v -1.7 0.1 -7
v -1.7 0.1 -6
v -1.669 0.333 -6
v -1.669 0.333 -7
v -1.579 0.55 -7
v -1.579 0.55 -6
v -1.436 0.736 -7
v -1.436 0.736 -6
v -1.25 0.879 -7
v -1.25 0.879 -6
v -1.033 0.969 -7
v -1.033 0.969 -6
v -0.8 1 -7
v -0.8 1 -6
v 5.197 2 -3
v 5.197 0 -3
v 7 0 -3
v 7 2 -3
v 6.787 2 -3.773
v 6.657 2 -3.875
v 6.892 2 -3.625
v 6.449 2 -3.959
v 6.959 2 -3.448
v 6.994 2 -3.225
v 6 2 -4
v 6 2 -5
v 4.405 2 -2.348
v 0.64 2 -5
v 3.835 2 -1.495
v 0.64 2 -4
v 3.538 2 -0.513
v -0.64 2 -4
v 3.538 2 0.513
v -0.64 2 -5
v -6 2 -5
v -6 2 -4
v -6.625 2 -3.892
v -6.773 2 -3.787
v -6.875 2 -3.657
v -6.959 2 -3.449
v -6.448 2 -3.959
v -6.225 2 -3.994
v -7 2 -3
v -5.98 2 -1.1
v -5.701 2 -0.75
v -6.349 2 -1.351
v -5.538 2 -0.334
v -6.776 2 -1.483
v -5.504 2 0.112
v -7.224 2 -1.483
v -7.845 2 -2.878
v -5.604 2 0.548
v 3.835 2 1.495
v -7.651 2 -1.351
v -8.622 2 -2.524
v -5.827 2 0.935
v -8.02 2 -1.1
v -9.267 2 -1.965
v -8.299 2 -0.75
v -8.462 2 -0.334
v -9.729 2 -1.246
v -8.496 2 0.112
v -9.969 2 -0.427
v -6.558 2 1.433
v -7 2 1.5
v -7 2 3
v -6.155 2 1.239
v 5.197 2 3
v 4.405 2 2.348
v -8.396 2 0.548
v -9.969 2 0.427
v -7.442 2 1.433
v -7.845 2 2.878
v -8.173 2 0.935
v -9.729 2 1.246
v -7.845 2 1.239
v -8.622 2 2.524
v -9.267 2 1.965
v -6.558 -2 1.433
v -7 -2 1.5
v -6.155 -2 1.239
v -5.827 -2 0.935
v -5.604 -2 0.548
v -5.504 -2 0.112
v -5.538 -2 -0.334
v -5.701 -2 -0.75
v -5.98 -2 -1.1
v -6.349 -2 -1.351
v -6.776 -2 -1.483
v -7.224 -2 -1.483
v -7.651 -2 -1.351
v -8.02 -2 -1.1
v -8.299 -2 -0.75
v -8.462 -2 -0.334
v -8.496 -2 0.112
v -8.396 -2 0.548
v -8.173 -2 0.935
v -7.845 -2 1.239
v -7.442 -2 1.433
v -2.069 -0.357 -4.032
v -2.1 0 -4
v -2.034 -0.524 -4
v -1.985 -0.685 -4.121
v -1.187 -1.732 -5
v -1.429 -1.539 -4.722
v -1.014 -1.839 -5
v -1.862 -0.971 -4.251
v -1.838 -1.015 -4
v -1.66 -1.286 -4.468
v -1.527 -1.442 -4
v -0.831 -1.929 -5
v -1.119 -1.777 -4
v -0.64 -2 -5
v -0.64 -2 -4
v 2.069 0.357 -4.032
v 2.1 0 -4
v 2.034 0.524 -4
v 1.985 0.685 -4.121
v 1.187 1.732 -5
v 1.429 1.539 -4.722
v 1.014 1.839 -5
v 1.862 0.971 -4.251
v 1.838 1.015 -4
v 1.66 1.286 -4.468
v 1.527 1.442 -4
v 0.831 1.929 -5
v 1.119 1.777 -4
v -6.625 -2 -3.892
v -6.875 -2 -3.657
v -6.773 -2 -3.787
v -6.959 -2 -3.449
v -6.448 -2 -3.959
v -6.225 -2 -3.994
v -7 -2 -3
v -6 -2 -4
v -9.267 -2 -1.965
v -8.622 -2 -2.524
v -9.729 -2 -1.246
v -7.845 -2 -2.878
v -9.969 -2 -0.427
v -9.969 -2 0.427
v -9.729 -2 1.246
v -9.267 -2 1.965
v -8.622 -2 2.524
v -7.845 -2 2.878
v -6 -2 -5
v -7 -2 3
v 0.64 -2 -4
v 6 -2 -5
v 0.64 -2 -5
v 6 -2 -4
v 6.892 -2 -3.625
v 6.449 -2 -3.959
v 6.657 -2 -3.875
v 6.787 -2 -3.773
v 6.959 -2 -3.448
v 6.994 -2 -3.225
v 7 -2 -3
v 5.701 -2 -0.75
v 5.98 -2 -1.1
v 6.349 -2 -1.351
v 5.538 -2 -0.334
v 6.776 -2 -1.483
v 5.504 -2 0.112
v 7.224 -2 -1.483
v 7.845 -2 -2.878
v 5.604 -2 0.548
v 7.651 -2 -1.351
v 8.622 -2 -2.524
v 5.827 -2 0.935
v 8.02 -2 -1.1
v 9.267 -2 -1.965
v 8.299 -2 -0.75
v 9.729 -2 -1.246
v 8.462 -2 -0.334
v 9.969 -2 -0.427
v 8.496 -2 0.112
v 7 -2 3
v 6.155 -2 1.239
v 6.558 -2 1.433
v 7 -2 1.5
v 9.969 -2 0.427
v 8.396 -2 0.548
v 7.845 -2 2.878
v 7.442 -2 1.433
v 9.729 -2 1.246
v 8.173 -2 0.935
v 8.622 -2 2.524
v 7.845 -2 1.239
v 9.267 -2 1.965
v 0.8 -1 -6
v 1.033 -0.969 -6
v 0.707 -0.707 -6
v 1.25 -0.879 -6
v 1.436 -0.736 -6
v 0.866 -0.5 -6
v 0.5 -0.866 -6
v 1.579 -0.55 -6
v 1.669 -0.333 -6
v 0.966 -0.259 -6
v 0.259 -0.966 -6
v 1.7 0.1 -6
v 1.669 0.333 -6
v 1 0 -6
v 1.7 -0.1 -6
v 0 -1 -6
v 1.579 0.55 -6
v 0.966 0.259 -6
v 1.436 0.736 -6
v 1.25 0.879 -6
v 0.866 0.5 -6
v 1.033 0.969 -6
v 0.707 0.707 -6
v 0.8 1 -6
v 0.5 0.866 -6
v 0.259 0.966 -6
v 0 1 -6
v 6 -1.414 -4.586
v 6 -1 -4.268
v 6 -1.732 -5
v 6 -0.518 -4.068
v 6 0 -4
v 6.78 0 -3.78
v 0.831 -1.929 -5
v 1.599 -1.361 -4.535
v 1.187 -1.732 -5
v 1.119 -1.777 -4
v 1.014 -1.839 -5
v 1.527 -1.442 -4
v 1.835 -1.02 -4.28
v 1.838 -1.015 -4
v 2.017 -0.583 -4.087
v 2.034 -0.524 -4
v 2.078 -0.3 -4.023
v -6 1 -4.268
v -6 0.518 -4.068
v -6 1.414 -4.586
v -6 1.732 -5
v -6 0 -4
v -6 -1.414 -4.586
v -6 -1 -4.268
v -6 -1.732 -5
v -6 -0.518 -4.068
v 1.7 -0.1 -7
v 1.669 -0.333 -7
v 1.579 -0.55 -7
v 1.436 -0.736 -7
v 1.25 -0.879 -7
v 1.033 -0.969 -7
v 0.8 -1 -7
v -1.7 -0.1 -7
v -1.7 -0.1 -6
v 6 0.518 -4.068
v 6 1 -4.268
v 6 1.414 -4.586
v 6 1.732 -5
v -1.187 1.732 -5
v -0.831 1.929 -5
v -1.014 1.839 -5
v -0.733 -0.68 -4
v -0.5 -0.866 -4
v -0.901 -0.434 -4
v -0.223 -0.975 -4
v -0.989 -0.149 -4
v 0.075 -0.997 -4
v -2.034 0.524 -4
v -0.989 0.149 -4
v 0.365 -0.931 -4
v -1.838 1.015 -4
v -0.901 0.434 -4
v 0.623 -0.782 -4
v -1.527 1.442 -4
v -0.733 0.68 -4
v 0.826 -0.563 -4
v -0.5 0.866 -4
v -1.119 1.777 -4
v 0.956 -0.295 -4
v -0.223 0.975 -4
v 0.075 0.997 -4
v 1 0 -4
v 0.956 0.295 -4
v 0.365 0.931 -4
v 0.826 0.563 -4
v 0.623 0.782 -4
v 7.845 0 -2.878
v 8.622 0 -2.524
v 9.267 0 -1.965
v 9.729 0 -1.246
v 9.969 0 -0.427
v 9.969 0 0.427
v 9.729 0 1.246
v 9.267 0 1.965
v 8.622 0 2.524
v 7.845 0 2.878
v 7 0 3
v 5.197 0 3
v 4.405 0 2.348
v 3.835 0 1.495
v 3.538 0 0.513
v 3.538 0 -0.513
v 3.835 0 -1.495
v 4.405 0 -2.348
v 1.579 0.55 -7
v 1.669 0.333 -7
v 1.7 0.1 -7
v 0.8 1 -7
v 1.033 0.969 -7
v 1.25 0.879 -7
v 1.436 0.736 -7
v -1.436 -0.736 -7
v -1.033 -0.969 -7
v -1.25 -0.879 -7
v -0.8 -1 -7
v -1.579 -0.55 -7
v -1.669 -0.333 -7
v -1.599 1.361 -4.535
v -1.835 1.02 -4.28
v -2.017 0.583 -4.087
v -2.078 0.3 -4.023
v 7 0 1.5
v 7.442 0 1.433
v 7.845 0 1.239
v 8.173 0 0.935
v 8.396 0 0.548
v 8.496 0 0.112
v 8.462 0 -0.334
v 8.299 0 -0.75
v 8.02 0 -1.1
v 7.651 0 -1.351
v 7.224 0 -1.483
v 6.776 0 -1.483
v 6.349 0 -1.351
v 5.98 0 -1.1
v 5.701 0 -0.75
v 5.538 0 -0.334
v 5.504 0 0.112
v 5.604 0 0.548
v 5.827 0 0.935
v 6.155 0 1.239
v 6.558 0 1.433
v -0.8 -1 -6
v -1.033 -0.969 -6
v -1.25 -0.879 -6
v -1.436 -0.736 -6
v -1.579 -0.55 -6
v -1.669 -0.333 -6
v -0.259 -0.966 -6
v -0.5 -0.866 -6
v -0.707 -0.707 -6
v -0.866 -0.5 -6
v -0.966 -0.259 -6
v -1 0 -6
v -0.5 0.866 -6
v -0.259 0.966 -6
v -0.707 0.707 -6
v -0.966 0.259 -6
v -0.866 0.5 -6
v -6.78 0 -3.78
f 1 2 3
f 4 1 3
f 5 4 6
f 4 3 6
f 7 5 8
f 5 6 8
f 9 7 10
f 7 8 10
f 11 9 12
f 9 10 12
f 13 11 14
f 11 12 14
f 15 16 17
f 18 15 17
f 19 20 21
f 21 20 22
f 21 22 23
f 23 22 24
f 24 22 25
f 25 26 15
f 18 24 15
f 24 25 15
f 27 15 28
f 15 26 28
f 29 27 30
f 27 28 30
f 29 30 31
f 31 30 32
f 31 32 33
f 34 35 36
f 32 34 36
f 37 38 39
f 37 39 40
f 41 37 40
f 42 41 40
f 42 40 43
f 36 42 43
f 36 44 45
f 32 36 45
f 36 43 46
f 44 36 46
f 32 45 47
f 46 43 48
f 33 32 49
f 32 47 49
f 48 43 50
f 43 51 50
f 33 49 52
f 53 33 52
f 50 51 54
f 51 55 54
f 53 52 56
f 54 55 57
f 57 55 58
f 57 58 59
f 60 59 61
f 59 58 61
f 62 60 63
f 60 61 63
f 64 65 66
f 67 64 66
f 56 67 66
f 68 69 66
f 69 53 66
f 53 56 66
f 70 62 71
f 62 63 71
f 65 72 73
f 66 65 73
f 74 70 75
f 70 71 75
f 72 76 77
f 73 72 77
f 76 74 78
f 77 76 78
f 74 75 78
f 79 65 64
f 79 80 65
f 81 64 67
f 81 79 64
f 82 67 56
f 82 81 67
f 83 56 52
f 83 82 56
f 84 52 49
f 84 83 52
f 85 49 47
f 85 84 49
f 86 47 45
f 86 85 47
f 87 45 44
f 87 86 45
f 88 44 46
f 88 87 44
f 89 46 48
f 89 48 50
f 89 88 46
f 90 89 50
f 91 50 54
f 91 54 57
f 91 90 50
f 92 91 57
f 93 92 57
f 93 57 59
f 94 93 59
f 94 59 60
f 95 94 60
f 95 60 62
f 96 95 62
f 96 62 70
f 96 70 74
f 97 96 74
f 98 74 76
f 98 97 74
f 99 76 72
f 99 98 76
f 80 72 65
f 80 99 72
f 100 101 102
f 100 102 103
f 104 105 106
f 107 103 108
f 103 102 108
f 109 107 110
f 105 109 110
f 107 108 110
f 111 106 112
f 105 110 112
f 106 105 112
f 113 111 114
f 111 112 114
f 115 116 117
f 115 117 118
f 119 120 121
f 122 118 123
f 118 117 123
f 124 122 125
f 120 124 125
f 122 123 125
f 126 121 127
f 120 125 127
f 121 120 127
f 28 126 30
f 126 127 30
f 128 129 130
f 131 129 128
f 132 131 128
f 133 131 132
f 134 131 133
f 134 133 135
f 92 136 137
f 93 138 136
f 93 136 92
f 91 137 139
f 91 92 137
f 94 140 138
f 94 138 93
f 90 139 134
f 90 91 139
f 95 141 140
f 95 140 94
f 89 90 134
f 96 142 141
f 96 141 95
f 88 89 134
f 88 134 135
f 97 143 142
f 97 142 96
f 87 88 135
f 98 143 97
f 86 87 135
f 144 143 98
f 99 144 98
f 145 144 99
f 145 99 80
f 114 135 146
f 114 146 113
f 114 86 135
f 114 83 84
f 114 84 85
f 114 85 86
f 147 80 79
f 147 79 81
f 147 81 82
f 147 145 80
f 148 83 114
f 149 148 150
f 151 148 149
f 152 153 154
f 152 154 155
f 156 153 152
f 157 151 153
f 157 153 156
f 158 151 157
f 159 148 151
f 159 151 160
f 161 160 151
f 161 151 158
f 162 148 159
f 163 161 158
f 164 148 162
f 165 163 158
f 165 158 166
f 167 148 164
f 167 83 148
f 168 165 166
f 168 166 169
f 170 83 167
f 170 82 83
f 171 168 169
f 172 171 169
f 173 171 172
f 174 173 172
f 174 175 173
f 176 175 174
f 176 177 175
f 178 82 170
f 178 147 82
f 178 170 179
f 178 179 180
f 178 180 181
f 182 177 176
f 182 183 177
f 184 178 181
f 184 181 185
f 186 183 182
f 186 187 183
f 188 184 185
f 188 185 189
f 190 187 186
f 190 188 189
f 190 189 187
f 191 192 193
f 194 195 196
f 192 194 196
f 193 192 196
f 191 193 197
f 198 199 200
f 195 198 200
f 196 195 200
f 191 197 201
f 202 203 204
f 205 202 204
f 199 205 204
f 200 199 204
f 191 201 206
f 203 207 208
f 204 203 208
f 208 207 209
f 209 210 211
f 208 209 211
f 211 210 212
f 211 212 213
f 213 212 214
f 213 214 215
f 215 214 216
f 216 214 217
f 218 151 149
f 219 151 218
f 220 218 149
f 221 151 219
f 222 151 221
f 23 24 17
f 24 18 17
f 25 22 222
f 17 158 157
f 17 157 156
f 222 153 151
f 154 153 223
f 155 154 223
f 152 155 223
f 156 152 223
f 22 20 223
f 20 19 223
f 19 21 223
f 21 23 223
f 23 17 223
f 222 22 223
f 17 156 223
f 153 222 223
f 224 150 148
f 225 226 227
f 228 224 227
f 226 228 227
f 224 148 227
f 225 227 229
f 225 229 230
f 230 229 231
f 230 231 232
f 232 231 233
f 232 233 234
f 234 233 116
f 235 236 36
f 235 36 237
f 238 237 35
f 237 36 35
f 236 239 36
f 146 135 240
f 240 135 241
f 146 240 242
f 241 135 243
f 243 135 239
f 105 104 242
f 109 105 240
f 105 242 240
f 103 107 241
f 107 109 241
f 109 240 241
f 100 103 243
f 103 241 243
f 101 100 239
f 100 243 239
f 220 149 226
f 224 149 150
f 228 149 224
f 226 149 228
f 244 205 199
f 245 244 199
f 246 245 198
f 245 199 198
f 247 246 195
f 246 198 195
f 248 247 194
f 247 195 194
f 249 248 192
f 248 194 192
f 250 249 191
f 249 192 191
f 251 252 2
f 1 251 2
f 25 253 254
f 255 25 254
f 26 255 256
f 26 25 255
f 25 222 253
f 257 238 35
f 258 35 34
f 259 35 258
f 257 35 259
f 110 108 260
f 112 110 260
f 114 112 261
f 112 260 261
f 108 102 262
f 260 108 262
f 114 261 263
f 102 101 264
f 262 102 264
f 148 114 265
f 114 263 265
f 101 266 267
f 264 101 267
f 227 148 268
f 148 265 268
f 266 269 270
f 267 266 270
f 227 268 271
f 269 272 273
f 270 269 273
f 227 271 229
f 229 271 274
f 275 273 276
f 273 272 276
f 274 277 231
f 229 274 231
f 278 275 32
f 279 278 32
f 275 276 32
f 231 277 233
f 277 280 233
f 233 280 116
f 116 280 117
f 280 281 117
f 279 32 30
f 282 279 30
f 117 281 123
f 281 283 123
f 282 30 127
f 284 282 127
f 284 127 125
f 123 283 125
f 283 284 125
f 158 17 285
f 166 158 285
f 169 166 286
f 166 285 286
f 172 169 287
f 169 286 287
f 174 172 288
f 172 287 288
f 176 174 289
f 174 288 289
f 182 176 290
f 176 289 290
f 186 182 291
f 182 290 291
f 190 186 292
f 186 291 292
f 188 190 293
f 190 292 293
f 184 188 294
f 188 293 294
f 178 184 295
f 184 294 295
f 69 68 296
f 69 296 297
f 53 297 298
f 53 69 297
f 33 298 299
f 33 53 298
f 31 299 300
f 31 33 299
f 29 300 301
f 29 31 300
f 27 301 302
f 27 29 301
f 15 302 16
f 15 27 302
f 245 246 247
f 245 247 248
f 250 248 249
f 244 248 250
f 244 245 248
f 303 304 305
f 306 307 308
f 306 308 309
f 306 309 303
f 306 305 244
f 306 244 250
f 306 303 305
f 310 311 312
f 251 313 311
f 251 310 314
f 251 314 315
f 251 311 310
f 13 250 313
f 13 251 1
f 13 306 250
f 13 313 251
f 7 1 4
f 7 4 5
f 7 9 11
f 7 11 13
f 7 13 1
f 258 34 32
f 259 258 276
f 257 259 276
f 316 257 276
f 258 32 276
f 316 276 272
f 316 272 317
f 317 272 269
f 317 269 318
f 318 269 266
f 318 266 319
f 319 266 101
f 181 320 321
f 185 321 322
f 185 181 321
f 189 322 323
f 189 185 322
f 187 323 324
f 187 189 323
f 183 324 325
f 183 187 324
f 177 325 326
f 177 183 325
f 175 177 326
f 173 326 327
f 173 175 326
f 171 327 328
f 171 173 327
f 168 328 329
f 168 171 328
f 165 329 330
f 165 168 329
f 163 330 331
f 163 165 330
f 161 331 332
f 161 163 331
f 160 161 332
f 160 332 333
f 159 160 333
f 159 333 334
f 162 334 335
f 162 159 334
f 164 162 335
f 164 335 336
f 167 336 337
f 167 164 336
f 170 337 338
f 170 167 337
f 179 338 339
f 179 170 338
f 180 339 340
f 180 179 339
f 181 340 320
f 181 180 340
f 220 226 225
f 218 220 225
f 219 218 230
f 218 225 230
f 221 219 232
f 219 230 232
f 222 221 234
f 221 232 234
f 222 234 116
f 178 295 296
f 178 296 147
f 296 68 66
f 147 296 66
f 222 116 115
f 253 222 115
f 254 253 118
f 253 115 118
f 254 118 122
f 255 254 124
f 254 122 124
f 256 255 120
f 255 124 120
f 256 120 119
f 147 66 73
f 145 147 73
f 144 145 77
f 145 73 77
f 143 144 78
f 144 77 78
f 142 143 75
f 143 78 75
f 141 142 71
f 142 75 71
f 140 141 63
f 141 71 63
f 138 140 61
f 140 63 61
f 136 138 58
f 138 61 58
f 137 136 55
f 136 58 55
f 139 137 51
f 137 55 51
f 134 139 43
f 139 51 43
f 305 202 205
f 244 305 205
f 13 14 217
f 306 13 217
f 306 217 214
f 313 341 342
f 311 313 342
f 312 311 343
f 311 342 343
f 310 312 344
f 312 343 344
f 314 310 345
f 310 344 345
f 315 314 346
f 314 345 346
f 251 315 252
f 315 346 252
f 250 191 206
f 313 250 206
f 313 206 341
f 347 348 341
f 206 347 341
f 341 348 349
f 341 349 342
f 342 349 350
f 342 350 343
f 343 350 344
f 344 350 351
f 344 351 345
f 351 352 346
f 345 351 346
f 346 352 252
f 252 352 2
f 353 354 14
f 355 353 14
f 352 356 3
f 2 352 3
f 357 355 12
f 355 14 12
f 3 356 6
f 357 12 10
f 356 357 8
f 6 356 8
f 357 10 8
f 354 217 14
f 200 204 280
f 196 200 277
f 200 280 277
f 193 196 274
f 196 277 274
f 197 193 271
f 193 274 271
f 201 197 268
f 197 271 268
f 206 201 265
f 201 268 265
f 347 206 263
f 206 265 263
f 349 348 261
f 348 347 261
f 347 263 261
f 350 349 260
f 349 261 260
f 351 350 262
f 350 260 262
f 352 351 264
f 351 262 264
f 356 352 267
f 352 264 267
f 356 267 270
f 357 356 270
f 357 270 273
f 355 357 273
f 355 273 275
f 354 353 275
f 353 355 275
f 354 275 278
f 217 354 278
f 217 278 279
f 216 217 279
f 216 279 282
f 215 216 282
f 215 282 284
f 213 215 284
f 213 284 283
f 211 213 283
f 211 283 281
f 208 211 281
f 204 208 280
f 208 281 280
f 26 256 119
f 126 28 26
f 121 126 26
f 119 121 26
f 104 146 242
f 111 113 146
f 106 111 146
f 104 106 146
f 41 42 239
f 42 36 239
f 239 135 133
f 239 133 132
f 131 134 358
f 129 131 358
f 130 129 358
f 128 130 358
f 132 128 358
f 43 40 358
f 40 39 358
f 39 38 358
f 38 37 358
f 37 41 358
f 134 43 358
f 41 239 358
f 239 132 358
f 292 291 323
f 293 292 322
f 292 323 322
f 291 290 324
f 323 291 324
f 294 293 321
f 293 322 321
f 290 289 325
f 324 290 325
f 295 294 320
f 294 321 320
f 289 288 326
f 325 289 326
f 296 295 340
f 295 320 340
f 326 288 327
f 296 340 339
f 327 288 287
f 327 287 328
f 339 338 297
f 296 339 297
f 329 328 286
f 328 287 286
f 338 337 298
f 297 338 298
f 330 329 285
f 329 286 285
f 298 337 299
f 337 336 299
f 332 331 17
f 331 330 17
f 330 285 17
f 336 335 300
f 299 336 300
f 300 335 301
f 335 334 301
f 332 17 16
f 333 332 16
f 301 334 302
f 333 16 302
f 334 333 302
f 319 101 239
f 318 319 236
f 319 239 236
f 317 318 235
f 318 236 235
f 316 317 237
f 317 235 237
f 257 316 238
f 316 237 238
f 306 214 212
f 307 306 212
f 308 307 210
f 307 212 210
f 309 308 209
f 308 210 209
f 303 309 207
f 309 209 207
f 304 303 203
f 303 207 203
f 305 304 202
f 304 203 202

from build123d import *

# Parameters (mm, degrees)
SKETCH1_R                = 1.5
BOSS_EXTRUDE1_DEPTH      = 2
CUT_EXTRUDE1_DEPTH       = 2
BOSS_EXTRUDE2_REACH      = 13.18
SKETCH3_W                = 14
SKETCH3_H                = 1
FILLET1_SIZE             = 1
BOSS_EXTRUDE3_DEPTH      = 6
BOSS_EXTRUDE3_DEPTH_BACK = 6
CUT_EXTRUDE4_START       = -4
SKETCH5_R                = 2.1
CUT_EXTRUDE4_DEPTH       = 10
SKETCH6_R                = 1
BOSS_EXTRUDE5_DEPTH      = 3
BOSS_EXTRUDE6_START      = 2
BOSS_EXTRUDE6_DEPTH      = 1


with BuildPart() as part:
    # Sketch1 → Boss-Extrude1 (new, symmetric)
    with BuildSketch(Plane(origin=(0, 0, 0), x_dir=(1, 0, 0), z_dir=(0, 1, 0))):
        with BuildLine():
            Line((-7, 3), (7, 3))
            ThreePointArc((7, 3), (10, 0), (7, -3))
            Line((7, -3), (-7, -3))
            ThreePointArc((-7, -3), (-10, 0), (-7, 3))
        make_face()
        with Locations(Location((-7, 0, 0), (0, 0, 270))):
            Circle(SKETCH1_R, mode=Mode.SUBTRACT)
        with Locations(Location((7, 0, 0), (0, 0, 270))):
            Circle(SKETCH1_R, mode=Mode.SUBTRACT)
    extrude(amount=BOSS_EXTRUDE1_DEPTH, both=True)

    # Sketch2 → Cut-Extrude1 (cut)
    with BuildSketch(Plane(origin=(0, 2, 0), x_dir=(1, 0, 0), z_dir=(0, 1, 0))):
        with BuildLine():
            Line((5.197224362, 3), (7, 3))
            ThreePointArc((7, 3), (10, 0), (7, -3))
            Line((7, -3), (5.197224362, -3))
            ThreePointArc((5.197224362, -3), (3.5, 0), (5.197224362, 3))
        make_face()
    extrude(amount=-CUT_EXTRUDE1_DEPTH, mode=Mode.SUBTRACT)

    # Boss-Extrude2: up to this face of the body (flat: up to its plane)
    boss_extrude2_end = Plane(part.part.faces().sort_by_distance((-2.270949872, 2, 0))[0])
    # Sketch3 → Boss-Extrude2 (add, up to the picked face)
    with BuildSketch(Plane.XZ.offset(2), mode=Mode.PRIVATE) as boss_extrude2_sk1:
        with Locations((0, -3.5)):
            Rectangle(SKETCH3_W, SKETCH3_H)
    boss_extrude2_tool1 = split(extrude(boss_extrude2_sk1.sketch, amount=-BOSS_EXTRUDE2_REACH, mode=Mode.PRIVATE), bisect_by=boss_extrude2_end, keep=Keep.BOTH, mode=Mode.PRIVATE)
    add(boss_extrude2_tool1.solids().sort_by(Axis((0, -2, -3.5), (0, 1, 0)))[0])

    # Fillet1
    # a fillet whose section is not a circle: 1 mm, written as the material it takes off along each edge
    with BuildSketch(Plane(origin=(7, -4.5, -4), x_dir=(0, 0, 1), z_dir=(0, 1, 0)), Plane(origin=(-7, -4.5, -4), x_dir=(1, 0, 0), z_dir=(0, 1, 0))) as fillet1_piece_1:
        with BuildLine():
            add(Edge.make_bspline([(FILLET1_SIZE, 0), (FILLET1_SIZE * 0.831801948466, 0), (FILLET1_SIZE * 0.663603896932, 0), (FILLET1_SIZE * 0.292893218813, -FILLET1_SIZE * 0.0716919198361), (FILLET1_SIZE * 0.0716919198361, -FILLET1_SIZE * 0.292893218813), (0, -FILLET1_SIZE * 0.663603896932), (0, -FILLET1_SIZE * 0.831801948466), (0, -FILLET1_SIZE)], knots=[0, 0, 0, 0, 0, 0, 0.5, 0.5, 1, 1, 1, 1, 1, 1], degree=5))
            Line((0, -FILLET1_SIZE), (0, 0))
            Line((0, 0), (FILLET1_SIZE, 0))
        make_face()
    extrude(amount=9, mode=Mode.SUBTRACT)

    # Sketch4 → Boss-Extrude3 (add, two sides: drawn at the far end of the back side and taken through both)
    with BuildSketch(Plane(origin=(0, 0, 0), x_dir=(0, 0, -1), z_dir=(1, 0, 0)).offset(-BOSS_EXTRUDE3_DEPTH_BACK)):
        with BuildLine():
            Line((5, 2), (4, 2))
            Line((4, 2), (4, 0))
            ThreePointArc((4, 0), (4.267949192, 1), (5, 1.732050808))
            Line((5, 1.732050808), (5, 2))
        make_face()
        with BuildLine():
            ThreePointArc((5, -1.732050808), (4.267949192, -1), (4, 0))
            Line((4, 0), (4, -2))
            Line((4, -2), (5, -2))
            Line((5, -2), (5, -1.732050808))
        make_face()
    extrude(amount=BOSS_EXTRUDE3_DEPTH + BOSS_EXTRUDE3_DEPTH_BACK)

    # Sketch5 → Cut-Extrude4 (cut)
    with BuildSketch(Plane.XY.offset(CUT_EXTRUDE4_START)):
        Circle(SKETCH5_R)
    extrude(amount=-CUT_EXTRUDE4_DEPTH, mode=Mode.SUBTRACT)

    # Sketch6 → Boss-Extrude5 (add)
    with BuildSketch(Plane(origin=(0, 0, -4), x_dir=(-1, 0, 0), z_dir=(0, 0, -1))):
        with Locations(Location((0, 0, 0), (0, 0, 180))):
            Circle(SKETCH6_R)
    extrude(amount=BOSS_EXTRUDE5_DEPTH)

    # Sketch6<3> → Boss-Extrude6 (add)
    with BuildSketch(Plane(origin=(0, 0, -4), x_dir=(-1, 0, 0), z_dir=(0, 0, -1)).offset(BOSS_EXTRUDE6_START)):
        with BuildLine():
            Line((0.8, 1), (0, 1))
            ThreePointArc((0, 1), (0.707106781, 0.707106781), (1, 0))
            ThreePointArc((1, 0), (0.707106781, -0.707106781), (0, -1))
            Line((0, -1), (0.8, -1))
            ThreePointArc((0.8, -1), (1.436396103, -0.736396103), (1.7, -0.1))
            Line((1.7, -0.1), (1.7, 0.1))
            ThreePointArc((1.7, 0.1), (1.436396103, 0.736396103), (0.8, 1))
        make_face()
        with BuildLine():
            ThreePointArc((0, -1), (-1, 0), (0, 1))
            Line((0, 1), (-0.8, 1))
            ThreePointArc((-0.8, 1), (-1.436396103, 0.736396103), (-1.7, 0.1))
            Line((-1.7, 0.1), (-1.7, -0.1))
            ThreePointArc((-1.7, -0.1), (-1.436396103, -0.736396103), (-0.8, -1))
            Line((-0.8, -1), (0, -1))
        make_face()
    extrude(amount=BOSS_EXTRUDE6_DEPTH)


solid = part.part
